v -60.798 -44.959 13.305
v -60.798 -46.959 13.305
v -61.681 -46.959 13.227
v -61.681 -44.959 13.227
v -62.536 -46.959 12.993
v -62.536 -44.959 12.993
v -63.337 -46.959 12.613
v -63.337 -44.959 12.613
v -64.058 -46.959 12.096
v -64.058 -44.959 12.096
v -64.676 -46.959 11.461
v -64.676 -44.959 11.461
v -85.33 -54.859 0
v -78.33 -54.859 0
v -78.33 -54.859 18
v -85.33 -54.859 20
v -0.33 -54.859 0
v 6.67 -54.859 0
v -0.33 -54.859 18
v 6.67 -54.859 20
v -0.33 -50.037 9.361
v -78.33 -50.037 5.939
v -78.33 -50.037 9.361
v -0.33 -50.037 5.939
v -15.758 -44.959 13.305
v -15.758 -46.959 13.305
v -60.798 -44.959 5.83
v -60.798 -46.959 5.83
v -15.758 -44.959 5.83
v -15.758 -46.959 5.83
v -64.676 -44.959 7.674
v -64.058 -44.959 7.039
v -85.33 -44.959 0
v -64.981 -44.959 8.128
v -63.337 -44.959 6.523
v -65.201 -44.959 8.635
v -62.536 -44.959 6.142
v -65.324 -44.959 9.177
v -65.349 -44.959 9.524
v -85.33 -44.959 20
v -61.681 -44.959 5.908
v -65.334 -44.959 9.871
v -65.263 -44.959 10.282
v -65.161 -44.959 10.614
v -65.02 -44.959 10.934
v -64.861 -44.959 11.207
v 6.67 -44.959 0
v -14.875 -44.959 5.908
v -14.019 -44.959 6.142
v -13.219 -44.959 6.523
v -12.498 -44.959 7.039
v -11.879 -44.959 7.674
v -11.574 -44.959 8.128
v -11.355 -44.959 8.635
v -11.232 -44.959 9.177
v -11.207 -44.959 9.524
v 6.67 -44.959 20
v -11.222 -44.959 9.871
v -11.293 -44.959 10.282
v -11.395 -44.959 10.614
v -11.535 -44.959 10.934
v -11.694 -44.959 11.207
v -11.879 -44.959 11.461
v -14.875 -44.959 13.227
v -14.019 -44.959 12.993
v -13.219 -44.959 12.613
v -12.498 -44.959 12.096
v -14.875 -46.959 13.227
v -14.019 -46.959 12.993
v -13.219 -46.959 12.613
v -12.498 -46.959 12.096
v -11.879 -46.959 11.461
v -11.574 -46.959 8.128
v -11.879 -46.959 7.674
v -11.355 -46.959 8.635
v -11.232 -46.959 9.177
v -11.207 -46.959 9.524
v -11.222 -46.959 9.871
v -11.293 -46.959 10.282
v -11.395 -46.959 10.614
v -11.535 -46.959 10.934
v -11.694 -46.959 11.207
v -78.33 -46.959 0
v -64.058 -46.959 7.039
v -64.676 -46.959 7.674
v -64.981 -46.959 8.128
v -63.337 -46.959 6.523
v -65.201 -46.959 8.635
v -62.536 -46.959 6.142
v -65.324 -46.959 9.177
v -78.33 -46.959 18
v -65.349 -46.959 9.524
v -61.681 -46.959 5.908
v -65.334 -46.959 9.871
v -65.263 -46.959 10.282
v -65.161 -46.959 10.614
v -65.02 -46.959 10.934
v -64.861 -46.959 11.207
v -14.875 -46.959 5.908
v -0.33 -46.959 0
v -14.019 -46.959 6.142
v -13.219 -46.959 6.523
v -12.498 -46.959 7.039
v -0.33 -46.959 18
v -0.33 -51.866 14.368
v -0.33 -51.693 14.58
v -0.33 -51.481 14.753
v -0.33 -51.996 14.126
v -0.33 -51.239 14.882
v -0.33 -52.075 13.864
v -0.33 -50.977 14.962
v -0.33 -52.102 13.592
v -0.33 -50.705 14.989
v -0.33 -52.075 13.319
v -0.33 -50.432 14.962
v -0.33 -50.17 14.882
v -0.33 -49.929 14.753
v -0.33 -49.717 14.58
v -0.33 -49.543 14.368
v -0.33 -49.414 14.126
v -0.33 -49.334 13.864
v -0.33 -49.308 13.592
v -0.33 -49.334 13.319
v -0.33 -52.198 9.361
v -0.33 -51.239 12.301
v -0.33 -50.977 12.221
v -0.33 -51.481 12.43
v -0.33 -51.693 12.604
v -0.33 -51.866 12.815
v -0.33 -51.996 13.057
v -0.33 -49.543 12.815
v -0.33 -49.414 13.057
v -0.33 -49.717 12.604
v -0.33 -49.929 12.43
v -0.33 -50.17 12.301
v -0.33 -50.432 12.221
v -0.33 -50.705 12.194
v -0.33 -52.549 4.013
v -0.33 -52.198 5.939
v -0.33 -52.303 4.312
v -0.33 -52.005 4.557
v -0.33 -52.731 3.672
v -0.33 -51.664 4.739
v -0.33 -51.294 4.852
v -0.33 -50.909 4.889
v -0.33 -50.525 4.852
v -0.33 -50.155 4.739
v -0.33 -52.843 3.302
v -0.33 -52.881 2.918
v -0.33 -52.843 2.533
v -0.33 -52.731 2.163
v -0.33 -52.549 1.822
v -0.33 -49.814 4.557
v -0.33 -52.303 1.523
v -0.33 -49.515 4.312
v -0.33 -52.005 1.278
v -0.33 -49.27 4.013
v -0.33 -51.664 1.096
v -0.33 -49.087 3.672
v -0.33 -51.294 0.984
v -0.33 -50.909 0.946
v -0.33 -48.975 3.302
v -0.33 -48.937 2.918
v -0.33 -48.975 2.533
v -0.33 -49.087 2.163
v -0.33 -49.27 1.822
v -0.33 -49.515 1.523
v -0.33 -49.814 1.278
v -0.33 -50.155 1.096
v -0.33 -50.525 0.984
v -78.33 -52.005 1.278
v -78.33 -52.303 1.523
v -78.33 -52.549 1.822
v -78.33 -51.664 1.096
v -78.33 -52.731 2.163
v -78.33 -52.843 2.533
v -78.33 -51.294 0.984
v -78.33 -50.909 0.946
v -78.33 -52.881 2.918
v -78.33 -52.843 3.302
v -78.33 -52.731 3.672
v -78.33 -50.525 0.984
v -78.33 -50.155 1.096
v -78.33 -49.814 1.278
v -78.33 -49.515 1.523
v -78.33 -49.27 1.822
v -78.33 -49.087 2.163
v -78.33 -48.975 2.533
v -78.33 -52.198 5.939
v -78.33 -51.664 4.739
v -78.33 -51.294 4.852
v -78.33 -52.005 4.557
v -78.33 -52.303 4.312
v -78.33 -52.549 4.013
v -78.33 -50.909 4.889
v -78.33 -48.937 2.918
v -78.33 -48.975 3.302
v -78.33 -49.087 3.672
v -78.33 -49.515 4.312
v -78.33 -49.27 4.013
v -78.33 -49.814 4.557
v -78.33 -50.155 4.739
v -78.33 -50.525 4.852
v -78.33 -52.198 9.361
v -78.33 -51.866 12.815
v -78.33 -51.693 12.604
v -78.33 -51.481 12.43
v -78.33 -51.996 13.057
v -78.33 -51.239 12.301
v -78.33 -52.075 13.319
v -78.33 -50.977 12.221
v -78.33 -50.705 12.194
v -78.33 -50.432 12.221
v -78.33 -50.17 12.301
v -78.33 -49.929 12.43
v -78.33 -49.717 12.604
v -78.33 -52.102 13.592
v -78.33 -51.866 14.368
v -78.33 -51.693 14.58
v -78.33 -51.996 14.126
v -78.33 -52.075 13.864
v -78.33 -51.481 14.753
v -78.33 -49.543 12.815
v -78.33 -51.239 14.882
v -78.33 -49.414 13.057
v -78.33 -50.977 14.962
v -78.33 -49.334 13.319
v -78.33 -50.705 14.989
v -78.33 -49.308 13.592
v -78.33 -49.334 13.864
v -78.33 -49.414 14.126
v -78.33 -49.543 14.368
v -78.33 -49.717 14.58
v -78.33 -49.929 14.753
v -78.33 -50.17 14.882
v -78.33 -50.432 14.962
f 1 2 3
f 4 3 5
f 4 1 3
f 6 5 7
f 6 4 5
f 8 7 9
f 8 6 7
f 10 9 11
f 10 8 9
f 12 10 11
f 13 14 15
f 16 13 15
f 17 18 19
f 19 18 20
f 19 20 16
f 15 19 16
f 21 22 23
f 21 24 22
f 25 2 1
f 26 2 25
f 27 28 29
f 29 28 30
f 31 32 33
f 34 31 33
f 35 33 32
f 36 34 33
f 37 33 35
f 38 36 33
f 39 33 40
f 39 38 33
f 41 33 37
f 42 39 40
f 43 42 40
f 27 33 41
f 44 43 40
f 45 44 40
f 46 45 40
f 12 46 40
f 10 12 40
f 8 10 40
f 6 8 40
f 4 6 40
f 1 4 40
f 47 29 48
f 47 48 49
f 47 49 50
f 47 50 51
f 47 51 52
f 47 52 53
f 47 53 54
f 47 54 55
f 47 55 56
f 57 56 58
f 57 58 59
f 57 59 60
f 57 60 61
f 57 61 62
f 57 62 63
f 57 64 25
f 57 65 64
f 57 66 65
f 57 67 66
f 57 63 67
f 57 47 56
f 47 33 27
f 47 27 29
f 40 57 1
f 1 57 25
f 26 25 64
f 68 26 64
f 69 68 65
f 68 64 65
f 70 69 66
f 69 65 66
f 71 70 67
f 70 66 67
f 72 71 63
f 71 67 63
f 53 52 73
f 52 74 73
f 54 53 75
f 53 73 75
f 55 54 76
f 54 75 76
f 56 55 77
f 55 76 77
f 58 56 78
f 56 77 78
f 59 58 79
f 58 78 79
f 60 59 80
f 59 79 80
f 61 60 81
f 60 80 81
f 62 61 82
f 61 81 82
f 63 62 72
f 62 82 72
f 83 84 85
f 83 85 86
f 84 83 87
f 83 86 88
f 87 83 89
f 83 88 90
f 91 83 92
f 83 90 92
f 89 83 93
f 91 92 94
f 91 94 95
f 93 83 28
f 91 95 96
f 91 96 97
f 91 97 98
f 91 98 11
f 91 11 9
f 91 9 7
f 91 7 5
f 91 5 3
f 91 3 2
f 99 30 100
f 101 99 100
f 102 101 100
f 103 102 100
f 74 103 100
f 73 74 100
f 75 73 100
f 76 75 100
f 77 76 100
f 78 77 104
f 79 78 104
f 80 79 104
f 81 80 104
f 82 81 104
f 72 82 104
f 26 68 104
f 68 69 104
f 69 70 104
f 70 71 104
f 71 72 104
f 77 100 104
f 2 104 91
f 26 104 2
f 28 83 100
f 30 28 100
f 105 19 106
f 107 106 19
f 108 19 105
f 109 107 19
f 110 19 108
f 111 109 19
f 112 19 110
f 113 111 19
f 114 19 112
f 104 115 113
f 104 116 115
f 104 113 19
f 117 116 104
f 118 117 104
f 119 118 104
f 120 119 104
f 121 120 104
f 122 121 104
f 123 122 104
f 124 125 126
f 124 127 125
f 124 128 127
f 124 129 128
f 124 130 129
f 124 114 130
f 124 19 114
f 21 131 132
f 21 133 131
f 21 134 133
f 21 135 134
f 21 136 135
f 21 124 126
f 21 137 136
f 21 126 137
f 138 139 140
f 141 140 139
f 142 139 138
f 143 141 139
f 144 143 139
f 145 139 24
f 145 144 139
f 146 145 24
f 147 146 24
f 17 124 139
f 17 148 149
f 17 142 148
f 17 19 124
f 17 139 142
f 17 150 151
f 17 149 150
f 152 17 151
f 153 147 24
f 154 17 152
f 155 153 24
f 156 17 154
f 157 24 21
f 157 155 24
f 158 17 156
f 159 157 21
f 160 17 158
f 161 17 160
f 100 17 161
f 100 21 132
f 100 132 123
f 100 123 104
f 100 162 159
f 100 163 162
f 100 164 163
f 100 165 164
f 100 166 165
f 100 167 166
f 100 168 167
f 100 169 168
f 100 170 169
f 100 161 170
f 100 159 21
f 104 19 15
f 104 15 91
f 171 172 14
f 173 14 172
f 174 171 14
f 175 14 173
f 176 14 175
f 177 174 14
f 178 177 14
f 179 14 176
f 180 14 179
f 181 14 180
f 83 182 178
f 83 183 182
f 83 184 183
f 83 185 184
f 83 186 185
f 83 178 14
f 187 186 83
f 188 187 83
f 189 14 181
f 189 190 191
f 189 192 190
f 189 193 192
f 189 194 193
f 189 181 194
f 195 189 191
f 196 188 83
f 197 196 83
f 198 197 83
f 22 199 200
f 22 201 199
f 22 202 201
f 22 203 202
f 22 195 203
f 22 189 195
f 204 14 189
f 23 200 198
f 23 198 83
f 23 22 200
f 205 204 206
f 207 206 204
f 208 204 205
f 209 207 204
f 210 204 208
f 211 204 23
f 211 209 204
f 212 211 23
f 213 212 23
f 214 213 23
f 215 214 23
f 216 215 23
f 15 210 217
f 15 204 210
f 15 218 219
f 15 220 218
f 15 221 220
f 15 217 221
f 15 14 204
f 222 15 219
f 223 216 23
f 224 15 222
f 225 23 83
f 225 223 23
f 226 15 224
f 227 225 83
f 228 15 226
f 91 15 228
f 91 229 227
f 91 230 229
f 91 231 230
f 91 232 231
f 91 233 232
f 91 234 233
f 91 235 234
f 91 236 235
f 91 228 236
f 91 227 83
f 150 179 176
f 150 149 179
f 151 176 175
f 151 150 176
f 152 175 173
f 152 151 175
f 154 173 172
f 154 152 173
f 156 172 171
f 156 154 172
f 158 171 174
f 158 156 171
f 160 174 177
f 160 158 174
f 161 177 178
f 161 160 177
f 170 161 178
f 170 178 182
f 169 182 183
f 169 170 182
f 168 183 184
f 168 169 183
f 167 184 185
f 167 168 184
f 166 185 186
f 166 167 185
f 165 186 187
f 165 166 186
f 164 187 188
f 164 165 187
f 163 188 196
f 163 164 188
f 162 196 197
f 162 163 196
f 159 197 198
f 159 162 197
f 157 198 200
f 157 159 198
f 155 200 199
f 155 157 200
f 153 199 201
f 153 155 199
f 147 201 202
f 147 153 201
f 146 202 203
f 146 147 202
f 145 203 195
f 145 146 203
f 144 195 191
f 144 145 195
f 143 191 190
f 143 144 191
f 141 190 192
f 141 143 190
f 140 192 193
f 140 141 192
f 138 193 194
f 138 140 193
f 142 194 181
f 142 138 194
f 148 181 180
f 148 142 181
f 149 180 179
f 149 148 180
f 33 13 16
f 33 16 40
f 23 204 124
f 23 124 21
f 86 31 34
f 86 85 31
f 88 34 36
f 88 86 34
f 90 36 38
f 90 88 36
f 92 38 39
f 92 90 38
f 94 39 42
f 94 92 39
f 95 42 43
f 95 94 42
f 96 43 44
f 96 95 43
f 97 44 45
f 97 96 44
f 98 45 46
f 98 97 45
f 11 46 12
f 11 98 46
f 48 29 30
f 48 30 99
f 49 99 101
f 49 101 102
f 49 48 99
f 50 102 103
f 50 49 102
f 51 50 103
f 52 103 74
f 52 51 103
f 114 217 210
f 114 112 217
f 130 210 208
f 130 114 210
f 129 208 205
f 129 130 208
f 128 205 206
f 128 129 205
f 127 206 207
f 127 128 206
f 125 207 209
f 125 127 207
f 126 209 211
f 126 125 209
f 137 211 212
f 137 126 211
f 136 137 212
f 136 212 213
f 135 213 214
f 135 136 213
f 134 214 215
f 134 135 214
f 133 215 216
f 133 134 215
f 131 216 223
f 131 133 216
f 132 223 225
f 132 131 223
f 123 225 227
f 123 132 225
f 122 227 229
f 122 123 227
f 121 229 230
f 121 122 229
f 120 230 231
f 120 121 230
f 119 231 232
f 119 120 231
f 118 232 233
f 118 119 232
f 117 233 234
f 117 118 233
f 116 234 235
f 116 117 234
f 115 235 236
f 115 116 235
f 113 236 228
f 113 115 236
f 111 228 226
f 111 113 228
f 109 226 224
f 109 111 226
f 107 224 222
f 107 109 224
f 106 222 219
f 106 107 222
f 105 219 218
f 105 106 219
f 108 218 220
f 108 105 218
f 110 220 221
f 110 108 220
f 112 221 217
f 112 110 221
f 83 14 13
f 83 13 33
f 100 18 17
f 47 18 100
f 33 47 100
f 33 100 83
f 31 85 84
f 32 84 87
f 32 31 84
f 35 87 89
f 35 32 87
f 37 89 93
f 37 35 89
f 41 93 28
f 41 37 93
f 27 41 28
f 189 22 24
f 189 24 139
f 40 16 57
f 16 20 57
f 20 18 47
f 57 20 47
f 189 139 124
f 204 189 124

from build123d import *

# Parameters (mm, degrees)
F0_W         = 82
F0_H         = 9.9
F1_DEPTH     = 20
F2_T         = -2
F3_DEPTH     = 2
F4_DEPTH     = 5
F6_R         = 1.3971487494
F5_R         = 1.9718048452
F7_DEPTH     = 74
F8_W         = 55.0399487838
F8_H         = 7.4755754322
F9_DEPTH     = 2
F10_T1_DEPTH = 2
F11_R        = 3
F12_W        = 1.8215961754
F12_H        = 3.4220837988
F13_DEPTH    = 1
F14_T4_DEPTH = 3.4220837988
F14_T9_DEPTH = 3.4220837988
F15_R        = 0.7
F16_W        = 0.433061509
F16_H        = 3.4220837988
F16_W_2      = 1.2856977906
F16_W_3      = 0.4418755459
F17_DEPTH    = 73
F19_DEPTH    = 10
F20_DEPTH    = 5


# Not quite as in the source:
# - a fillet or chamfer that OpenCascade refuses, or shapes differently, is made with other operations: its cross-section is extruded or revolved along the edge and cut away or added
# - a feature of the source that left no trace in its solid (it failed there, or was rolled back) is left out


with BuildPart() as f1:
    # F0 (on Top) → F1 (new body)
    with BuildSketch(Plane.XY):
        with Locations((-34.3298178315, -49.909187454)):
            Rectangle(F0_W, F0_H)
    extrude(amount=F1_DEPTH)

    # F2
    f2_openings = [f1.faces().sort_by_distance(p)[0] for p in [
        (-34.329818, -54.859187, 10),
    ]]
    offset(amount=F2_T, openings=f2_openings)

    # F3 (cut): a face of the model
    f3_faces = [f1.faces().sort_by_distance(p)[0] for p in [
        (-34.3298178315, -50.909187454, 2),
    ]]
    extrude(f3_faces, amount=-F3_DEPTH, mode=Mode.SUBTRACT)

    # F4 (add): a face of the model
    f4_faces = [f1.faces().sort_by_distance(p)[0] for p in [
        (4.6701821685, -50.909187454, 9),
    ]]
    extrude(f4_faces, amount=F4_DEPTH)

    # F6 (on face) + F5 (on face) → F7 (join)
    with BuildSketch(Plane(origin=(-0.3298178315, 0, 0), x_dir=(0, -1, 0), z_dir=(-1, 0, 0))):
        with Locations((50.704728812, 13.591603376)):
            Circle(F6_R)
    with BuildSketch(Plane(origin=(-0.3298178315, 0, 0), x_dir=(0, -1, 0), z_dir=(-1, 0, 0))):
        with Locations((50.909187454, 2.9176021926)):
            Circle(F5_R)
    extrude(amount=F7_DEPTH)

    # F8 (on face) → F9 (cut)
    with BuildSketch(Plane.XZ.offset(46.959187454)):
        with Locations((-38.2777568884, 9.5675773919)):
            Rectangle(F8_W, F8_H)
    extrude(amount=-F9_DEPTH, mode=Mode.SUBTRACT)

    # F10: fillet of radius 5 on 4 edges, made by hand

    # F10_s2 → F10_t1 (join)
    with BuildSketch(Plane.XZ.offset(44.959187454)):
        with BuildLine():
            ThreePointArc((-15.7577824965, 5.8297896758), (-12.2222485906, 7.2942557698), (-10.7577824965, 10.8297896758))
            Line((-10.7577824965, 10.8297896758), (-10.7577824965, 5.8297896758))
            Line((-10.7577824965, 5.8297896758), (-15.7577824965, 5.8297896758))
        make_face()
        with BuildLine():
            ThreePointArc((-65.7977312803, 10.8297896758), (-64.3332651863, 7.2942557698), (-60.7977312803, 5.8297896758))
            Line((-60.7977312803, 5.8297896758), (-65.7977312803, 5.8297896758))
            Line((-65.7977312803, 5.8297896758), (-65.7977312803, 10.8297896758))
        make_face()
        with BuildLine():
            ThreePointArc((-60.7977312803, 13.305365108), (-64.3332651863, 11.8408990139), (-65.7977312803, 8.305365108))
            Line((-65.7977312803, 8.305365108), (-65.7977312803, 13.305365108))
            Line((-65.7977312803, 13.305365108), (-60.7977312803, 13.305365108))
        make_face()
        with BuildLine():
            ThreePointArc((-15.7577824965, 13.305365108), (-12.2222485906, 11.8408990139), (-10.7577824965, 8.305365108))
            Line((-10.7577824965, 8.305365108), (-10.7577824965, 13.305365108))
            Line((-10.7577824965, 13.305365108), (-15.7577824965, 13.305365108))
        make_face()
    extrude(amount=F10_T1_DEPTH)

    # F11
    f11_edges = [f1.edges().sort_by_distance(p)[0] for p in [
        (-10.919723, -45.959187, 9.567577),
        (-65.635791, -45.959187, 9.567577),
    ]]
    fillet(f11_edges, radius=F11_R)

    # F12 (on face) → F13 (join)
    with BuildSketch(Plane(origin=(-0.3298178315, 0, 0), x_dir=(0, -1, 0), z_dir=(-1, 0, 0))):
        with Locations((51.1129107326, 7.6496207621)):
            Rectangle(F12_W, F12_H)
    extrude(amount=F13_DEPTH)

    # F14: fillet of radius 2 on 2 edges, made by hand


with BuildPart() as f14_tool2:
    # F14_s3 → F14_t4 (new body)
    with BuildSketch(Plane.XY.offset(5.9385788627)):
        with BuildLine():
            ThreePointArc((0.6701821685, -52.0237088203), (-0.7440313939, -51.4379223827), (-1.3298178315, -50.0237088203))
            Line((-1.3298178315, -50.0237088203), (-1.3698178315, -50.0237088203))
            Line((-1.3698178315, -50.0237088203), (-1.3698178315, -52.0637088203))
            Line((-1.3698178315, -52.0637088203), (0.6701821685, -52.0637088203))
            Line((0.6701821685, -52.0637088203), (0.6701821685, -52.0237088203))
        make_face()
    extrude(amount=F14_T4_DEPTH)

    split(bisect_by=Plane.YZ.offset(-0.3298178315), keep=Keep.BOTTOM)


with BuildPart() as f1_1:
    add(f1.part)

    # F14_t1: cut F14_tool2
    add(f14_tool2.part, mode=Mode.SUBTRACT)


with BuildPart() as f14_tool7:
    # F14_s8 → F14_t9 (new body)
    with BuildSketch(Plane.XY.offset(9.3606626615)):
        with BuildLine():
            ThreePointArc((0.6701821685, -50.2021126449), (-0.7440313939, -50.7878990825), (-1.3298178315, -52.2021126449))
            Line((-1.3298178315, -52.2021126449), (-1.3698178315, -52.2021126449))
            Line((-1.3698178315, -52.2021126449), (-1.3698178315, -50.1621126449))
            Line((-1.3698178315, -50.1621126449), (0.6701821685, -50.1621126449))
            Line((0.6701821685, -50.1621126449), (0.6701821685, -50.2021126449))
        make_face()
    extrude(amount=-F14_T9_DEPTH)

    split(bisect_by=Plane.YZ.offset(-0.3298178315), keep=Keep.BOTTOM)


with BuildPart() as f1_2:
    add(f1_1.part)

    # F14_t6: cut F14_tool7
    add(f14_tool7.part, mode=Mode.SUBTRACT)

    # F15
    f15_edges = [f1_2.edges().sort_by_distance(p)[0] for p in [
        (-1.007208, -51.112911, 7.649621),
    ]]
    fillet(f15_edges, radius=F15_R)

    # F16 (on face) → F17 (join)
    with BuildSketch(Plane(origin=(-0.3298178315, 0, 0), x_dir=(0, -1, 0), z_dir=(-1, 0, 0))):
        with Locations((50.2535310828, 7.6496207621)):
            Rectangle(F16_W, F16_H)
        with Locations((51.1129107326, 7.6496207621)):
            Rectangle(F16_W_2, F16_H)
        with Locations((51.9766974008, 7.6496207621)):
            Rectangle(F16_W_3, F16_H)
    extrude(amount=F17_DEPTH)

    # F19 (add): a face of the model
    f19_faces = [f1_2.faces().sort_by_distance(p)[0] for p in [
        (-75.3298178315, -49.909187454, 10),
    ]]
    extrude(f19_faces, amount=F19_DEPTH)

    # F20 (cut): a face of the model
    f20_faces = [f1_2.faces().sort_by_distance(p)[0] for p in [
        (-73.3298178315, -50.9067397847, 9.4818900009),
    ]]
    extrude(f20_faces, amount=-F20_DEPTH, mode=Mode.SUBTRACT)


solid = f1_2.part
